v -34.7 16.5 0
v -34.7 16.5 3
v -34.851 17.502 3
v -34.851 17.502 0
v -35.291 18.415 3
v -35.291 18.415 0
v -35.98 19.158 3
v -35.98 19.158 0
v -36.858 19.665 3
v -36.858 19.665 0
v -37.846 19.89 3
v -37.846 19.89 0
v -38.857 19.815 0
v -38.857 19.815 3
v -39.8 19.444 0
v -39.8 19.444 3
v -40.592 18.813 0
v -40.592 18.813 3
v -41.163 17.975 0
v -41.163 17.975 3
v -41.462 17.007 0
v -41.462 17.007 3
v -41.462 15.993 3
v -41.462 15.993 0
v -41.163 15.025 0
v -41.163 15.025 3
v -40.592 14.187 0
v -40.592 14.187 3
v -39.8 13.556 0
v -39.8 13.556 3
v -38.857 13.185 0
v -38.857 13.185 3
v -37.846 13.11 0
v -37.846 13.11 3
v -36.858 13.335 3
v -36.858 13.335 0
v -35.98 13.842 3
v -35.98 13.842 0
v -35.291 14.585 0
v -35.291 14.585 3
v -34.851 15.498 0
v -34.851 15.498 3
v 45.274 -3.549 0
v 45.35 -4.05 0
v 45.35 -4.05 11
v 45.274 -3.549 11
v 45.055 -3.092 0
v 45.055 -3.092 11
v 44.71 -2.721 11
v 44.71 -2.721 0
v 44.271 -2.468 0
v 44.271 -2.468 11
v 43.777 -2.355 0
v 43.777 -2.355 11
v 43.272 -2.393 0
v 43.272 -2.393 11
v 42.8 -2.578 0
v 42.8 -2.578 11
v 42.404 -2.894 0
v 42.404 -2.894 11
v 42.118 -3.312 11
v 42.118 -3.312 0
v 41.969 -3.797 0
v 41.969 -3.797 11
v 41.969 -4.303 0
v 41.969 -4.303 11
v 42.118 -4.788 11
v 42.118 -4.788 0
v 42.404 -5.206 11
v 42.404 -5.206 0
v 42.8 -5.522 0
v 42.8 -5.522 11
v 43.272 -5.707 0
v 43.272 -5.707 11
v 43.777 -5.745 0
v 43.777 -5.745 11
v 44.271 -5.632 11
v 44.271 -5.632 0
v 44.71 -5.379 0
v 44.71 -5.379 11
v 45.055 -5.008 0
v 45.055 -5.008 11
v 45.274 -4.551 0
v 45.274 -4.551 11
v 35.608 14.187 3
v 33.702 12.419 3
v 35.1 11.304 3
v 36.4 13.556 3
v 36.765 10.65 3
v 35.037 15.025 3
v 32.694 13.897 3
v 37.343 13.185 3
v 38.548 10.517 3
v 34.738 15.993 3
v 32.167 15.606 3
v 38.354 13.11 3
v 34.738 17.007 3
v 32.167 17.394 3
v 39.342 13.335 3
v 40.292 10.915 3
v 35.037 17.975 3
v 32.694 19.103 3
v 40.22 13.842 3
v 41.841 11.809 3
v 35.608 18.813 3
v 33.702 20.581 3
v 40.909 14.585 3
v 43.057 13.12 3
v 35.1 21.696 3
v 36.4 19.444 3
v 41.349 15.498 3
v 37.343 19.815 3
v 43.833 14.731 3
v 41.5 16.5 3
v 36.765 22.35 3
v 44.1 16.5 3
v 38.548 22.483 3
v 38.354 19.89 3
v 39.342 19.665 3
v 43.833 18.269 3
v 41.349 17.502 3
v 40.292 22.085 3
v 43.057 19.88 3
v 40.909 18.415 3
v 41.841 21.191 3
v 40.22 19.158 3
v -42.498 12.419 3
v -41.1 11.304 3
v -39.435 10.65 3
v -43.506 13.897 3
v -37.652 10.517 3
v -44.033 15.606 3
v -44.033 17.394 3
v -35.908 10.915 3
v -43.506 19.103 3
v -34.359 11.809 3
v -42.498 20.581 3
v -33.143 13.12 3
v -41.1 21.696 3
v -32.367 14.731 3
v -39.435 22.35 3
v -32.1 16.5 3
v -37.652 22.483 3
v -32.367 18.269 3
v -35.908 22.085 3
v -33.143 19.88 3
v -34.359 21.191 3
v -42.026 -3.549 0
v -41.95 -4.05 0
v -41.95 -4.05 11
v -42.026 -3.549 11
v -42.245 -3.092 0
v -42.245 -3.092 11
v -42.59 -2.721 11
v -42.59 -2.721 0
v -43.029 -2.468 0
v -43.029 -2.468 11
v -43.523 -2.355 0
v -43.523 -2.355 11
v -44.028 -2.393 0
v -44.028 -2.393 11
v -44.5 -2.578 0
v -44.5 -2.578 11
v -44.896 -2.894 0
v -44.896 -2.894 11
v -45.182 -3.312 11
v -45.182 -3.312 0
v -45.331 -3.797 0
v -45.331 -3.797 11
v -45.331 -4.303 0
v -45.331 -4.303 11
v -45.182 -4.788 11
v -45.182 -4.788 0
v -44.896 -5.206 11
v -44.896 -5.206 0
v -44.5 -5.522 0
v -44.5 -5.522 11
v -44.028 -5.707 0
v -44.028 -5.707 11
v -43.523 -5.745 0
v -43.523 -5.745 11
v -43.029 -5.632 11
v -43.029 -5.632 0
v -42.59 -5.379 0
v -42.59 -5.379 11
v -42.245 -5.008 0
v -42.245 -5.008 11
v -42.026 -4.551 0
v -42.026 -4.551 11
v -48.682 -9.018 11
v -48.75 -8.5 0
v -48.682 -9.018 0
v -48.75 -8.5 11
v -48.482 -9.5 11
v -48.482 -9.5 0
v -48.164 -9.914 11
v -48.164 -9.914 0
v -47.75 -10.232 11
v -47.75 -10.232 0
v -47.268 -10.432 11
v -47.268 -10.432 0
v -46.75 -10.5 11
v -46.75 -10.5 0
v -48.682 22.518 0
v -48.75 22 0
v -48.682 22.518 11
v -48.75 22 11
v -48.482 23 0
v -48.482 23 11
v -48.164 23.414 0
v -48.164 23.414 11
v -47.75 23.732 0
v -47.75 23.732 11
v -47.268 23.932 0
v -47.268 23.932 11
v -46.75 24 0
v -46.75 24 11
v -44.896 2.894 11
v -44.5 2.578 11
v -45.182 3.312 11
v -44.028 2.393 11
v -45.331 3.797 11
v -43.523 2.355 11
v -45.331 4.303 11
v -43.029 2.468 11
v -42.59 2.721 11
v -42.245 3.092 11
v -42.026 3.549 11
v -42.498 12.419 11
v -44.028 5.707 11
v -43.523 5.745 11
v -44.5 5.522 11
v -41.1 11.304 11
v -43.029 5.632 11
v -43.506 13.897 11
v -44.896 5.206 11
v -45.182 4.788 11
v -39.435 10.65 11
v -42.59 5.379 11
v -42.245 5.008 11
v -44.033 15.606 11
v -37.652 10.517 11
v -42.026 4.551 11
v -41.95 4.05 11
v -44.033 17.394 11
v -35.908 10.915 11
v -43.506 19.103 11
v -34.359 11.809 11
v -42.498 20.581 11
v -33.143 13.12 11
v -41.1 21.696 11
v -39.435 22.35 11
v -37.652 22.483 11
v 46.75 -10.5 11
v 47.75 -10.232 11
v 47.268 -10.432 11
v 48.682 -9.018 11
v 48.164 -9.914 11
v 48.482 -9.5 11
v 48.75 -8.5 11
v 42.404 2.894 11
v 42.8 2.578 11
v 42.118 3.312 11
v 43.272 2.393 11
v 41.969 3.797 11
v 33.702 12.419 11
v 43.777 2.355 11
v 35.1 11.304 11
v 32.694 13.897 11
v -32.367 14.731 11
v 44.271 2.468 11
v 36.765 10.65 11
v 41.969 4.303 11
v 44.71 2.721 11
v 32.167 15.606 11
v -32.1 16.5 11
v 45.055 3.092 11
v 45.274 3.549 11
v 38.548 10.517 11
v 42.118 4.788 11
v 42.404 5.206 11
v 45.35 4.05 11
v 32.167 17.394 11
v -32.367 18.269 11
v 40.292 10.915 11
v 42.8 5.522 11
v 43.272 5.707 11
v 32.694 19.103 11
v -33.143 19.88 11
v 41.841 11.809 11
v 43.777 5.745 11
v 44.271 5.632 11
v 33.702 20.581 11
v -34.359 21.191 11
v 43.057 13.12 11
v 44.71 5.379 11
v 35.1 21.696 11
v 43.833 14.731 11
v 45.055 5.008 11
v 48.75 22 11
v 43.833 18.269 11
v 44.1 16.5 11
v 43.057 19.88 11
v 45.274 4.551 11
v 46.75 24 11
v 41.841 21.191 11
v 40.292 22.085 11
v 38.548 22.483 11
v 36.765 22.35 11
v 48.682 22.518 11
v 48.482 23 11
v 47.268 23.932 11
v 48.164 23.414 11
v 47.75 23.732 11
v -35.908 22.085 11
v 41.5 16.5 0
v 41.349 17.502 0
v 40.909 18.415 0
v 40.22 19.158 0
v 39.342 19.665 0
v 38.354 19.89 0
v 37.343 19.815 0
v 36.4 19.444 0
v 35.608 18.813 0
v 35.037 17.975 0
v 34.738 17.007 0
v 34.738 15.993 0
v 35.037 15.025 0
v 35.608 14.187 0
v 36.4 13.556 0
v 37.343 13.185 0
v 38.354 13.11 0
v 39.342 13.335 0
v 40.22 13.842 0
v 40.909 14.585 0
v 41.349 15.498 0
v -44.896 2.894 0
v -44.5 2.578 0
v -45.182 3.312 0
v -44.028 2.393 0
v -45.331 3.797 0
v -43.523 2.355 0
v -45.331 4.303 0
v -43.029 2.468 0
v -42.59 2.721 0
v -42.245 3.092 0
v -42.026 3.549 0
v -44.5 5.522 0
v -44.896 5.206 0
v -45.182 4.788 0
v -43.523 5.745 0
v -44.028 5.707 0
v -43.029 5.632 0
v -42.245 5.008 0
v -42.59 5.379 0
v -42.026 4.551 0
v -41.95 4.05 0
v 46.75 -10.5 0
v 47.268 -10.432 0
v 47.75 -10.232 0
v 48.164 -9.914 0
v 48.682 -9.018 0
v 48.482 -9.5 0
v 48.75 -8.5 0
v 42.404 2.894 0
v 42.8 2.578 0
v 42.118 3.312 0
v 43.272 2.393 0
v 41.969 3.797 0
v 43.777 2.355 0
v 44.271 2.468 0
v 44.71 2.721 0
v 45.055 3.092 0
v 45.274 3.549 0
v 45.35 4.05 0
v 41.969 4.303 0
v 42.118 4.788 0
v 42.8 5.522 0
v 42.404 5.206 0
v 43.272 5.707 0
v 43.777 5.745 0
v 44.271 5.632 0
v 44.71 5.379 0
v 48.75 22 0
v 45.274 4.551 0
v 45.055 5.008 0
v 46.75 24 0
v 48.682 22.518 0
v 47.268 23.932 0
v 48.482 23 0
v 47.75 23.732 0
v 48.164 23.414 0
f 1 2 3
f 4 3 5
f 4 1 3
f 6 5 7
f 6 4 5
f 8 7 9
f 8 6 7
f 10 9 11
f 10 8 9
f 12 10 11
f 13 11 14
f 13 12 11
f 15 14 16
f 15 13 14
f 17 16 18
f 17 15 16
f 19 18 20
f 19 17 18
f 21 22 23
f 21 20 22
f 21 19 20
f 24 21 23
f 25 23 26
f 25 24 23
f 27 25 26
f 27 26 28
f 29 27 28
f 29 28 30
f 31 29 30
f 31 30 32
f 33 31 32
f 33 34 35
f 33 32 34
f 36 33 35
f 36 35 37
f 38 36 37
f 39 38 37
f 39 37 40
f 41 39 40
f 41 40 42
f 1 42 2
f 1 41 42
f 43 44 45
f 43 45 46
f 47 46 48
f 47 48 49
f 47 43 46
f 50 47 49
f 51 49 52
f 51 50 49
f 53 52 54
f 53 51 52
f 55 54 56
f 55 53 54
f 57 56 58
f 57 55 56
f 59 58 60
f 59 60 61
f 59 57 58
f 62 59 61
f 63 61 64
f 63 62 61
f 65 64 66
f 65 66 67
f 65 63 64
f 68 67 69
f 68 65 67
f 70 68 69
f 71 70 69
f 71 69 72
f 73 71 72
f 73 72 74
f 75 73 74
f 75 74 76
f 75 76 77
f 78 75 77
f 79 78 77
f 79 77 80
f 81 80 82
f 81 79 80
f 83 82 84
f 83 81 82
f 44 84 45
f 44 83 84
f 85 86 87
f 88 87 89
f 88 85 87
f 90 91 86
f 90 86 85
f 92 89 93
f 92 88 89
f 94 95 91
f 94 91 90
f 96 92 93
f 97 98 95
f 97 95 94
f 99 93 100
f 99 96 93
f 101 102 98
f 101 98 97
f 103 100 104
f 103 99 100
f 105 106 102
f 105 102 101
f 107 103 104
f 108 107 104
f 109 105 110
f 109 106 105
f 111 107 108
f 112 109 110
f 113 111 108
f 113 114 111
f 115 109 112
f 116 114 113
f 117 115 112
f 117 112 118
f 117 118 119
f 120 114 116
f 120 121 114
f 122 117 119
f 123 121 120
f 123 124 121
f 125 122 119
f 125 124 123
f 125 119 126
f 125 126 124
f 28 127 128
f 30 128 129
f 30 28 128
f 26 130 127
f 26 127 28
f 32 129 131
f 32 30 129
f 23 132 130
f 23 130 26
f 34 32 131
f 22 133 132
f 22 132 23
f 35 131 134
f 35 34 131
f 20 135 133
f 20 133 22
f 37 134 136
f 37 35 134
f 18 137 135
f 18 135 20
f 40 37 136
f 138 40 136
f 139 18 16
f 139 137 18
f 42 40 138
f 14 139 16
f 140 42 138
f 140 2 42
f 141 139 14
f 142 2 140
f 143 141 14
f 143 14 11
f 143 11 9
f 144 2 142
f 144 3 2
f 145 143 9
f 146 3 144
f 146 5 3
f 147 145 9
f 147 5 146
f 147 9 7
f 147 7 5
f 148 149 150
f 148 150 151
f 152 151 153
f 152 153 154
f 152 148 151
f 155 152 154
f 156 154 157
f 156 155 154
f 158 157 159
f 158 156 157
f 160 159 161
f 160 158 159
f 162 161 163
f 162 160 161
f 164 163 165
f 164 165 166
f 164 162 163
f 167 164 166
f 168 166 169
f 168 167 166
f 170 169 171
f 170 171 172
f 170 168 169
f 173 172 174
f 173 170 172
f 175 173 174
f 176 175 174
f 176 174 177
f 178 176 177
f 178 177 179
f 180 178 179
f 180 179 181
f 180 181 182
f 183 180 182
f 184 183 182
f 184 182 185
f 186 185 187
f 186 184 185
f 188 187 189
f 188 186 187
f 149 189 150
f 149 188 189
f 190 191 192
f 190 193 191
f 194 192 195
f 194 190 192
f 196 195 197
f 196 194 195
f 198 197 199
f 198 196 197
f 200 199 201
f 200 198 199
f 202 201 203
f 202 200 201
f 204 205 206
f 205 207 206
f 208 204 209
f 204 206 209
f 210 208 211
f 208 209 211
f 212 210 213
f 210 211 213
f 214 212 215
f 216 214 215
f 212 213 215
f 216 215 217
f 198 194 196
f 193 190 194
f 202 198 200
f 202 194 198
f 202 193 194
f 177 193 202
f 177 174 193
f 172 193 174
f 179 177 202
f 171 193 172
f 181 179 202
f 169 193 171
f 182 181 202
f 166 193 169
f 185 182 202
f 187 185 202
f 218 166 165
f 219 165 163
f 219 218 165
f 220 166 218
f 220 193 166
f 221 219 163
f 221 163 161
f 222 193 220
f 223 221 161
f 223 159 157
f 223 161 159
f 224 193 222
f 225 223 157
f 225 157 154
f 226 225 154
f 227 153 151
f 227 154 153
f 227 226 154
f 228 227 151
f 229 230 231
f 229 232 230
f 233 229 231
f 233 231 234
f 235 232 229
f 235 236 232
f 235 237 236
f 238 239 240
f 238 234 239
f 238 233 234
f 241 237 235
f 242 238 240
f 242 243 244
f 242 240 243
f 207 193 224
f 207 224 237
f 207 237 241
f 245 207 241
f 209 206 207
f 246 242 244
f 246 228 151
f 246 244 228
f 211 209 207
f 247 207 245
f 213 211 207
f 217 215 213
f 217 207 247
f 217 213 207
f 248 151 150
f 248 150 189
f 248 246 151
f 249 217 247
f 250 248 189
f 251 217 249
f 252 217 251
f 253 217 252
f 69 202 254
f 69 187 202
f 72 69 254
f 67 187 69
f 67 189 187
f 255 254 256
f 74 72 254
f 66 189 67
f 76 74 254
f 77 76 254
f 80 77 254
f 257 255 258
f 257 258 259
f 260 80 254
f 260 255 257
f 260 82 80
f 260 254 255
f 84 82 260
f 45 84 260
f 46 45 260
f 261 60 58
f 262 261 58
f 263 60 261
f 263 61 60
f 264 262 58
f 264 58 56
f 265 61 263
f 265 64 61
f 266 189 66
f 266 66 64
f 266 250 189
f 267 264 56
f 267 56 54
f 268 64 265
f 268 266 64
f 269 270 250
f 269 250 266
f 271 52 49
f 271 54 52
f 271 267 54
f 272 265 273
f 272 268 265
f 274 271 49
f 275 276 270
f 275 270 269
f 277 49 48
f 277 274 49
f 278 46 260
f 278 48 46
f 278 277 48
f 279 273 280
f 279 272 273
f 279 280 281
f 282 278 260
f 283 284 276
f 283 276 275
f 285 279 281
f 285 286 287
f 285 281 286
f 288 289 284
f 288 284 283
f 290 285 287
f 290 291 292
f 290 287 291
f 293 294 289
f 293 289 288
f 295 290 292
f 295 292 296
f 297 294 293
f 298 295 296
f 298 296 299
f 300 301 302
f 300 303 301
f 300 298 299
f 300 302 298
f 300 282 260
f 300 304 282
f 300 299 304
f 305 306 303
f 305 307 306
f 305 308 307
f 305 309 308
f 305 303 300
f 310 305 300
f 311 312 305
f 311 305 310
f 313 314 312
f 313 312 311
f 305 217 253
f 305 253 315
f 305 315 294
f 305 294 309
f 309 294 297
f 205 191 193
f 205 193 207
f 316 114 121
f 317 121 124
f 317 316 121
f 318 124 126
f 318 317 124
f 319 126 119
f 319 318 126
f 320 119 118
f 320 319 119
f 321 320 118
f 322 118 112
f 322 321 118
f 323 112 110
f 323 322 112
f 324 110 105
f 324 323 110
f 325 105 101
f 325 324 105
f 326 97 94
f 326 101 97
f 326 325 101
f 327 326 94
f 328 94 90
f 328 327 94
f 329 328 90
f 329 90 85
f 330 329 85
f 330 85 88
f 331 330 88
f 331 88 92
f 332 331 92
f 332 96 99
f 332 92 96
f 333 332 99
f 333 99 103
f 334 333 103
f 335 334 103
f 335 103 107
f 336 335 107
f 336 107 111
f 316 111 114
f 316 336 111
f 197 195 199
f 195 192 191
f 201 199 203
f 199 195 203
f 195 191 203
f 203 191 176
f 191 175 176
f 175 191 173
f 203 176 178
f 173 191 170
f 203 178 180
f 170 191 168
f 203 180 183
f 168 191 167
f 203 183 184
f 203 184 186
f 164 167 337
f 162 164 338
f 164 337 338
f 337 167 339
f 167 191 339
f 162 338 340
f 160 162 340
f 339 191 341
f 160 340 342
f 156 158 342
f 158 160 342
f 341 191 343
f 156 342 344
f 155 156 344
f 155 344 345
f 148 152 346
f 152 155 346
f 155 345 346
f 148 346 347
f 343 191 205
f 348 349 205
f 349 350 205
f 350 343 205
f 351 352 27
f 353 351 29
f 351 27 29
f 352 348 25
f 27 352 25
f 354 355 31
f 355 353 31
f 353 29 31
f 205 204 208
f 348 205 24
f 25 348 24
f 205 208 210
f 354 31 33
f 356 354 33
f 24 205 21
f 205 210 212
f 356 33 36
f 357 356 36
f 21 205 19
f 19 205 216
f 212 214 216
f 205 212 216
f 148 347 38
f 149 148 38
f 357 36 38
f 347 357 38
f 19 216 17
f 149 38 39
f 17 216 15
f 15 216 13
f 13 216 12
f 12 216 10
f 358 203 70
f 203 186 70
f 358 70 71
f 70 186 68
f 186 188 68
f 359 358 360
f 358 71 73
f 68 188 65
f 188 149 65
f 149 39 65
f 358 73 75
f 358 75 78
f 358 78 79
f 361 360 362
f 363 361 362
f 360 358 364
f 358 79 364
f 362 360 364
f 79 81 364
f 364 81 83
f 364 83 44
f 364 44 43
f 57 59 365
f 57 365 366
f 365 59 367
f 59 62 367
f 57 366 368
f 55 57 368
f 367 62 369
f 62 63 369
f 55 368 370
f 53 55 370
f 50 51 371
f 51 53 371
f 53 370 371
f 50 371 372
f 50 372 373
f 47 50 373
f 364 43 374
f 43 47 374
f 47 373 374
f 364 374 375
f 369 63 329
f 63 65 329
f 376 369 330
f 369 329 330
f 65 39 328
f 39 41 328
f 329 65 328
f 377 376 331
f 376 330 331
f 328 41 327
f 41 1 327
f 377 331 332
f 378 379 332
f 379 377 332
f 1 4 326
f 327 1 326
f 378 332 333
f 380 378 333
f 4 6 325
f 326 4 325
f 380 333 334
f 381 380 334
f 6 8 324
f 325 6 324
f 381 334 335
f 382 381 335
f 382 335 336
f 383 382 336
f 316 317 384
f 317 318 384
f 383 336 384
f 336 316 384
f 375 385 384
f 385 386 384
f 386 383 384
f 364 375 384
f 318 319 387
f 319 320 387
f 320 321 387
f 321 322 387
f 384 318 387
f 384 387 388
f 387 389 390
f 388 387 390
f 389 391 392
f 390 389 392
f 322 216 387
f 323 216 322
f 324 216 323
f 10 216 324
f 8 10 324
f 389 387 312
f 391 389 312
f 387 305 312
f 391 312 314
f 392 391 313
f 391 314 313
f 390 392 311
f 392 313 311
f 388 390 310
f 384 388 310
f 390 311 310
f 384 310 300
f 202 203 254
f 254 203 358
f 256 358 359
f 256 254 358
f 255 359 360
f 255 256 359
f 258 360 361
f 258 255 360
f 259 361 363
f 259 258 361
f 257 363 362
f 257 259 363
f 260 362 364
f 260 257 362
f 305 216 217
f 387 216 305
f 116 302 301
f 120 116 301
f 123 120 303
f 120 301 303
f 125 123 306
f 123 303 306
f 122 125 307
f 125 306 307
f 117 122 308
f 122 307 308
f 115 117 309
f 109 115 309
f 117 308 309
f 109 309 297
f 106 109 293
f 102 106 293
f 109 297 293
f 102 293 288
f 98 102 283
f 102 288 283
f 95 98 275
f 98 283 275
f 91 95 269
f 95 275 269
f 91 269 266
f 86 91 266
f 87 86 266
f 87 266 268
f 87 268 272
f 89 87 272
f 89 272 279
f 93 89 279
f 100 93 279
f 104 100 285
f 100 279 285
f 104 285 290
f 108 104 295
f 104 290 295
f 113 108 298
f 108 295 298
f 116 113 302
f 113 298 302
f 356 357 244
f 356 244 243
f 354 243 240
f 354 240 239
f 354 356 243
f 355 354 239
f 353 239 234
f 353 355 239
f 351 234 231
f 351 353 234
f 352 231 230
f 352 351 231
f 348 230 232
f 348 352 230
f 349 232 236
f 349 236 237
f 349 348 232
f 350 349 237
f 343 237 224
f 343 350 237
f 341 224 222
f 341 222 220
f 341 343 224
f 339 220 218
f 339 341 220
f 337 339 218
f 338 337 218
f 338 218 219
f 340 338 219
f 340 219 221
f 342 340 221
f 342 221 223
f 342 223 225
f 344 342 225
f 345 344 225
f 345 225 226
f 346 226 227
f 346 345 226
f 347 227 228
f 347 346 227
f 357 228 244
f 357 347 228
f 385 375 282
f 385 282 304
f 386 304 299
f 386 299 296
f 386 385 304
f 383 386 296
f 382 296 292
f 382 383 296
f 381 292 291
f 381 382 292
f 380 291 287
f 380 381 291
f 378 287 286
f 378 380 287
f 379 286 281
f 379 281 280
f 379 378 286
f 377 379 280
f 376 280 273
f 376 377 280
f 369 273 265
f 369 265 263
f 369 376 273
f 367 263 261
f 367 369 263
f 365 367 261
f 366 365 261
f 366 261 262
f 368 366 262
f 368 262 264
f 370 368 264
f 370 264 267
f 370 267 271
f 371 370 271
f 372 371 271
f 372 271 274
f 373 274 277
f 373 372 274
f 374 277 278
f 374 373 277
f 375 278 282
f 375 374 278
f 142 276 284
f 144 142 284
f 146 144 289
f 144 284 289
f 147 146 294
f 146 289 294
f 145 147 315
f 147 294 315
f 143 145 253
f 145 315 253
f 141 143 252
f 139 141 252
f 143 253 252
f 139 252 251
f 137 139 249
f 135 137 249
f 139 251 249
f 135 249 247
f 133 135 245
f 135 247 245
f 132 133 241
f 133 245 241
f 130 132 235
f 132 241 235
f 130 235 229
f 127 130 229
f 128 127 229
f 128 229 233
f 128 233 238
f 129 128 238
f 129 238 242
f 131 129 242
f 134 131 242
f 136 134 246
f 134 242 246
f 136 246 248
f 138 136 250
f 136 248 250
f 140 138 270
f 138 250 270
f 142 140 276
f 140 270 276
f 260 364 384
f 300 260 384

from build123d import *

# Parameters (mm, degrees)
F0_W     = 97.5
F0_H     = 34.5
F0_R     = 1.7
F0_R_2   = 3.4
F1_DEPTH = 11
F2_R     = 6
F3_DEPTH = 8
F4_R     = 2


with BuildPart() as f1:
    # F0 (on Top) → F1 (new body)
    with BuildSketch(Plane.XY):
        with Locations((0, 6.75)):
            Rectangle(F0_W, F0_H)
        with Locations((-43.65, -4.05)):
            Circle(F0_R, mode=Mode.SUBTRACT)
        with Locations((-43.65, 4.05)):
            Circle(F0_R, mode=Mode.SUBTRACT)
        with Locations((43.65, -4.05)):
            Circle(F0_R, mode=Mode.SUBTRACT)
        with Locations((43.65, 4.05)):
            Circle(F0_R, mode=Mode.SUBTRACT)
        with Locations((-38.1, 16.5)):
            Circle(F0_R_2, mode=Mode.SUBTRACT)
        with Locations((38.1, 16.5)):
            Circle(F0_R_2, mode=Mode.SUBTRACT)
    extrude(amount=F1_DEPTH)

    # F2 (on face) → F3 (cut)
    with BuildSketch(Plane.XY.offset(11)):
        with Locations((-38.1, 16.5)):
            Circle(F2_R)
        with Locations((38.1, 16.5)):
            Circle(F2_R)
    extrude(amount=-F3_DEPTH, mode=Mode.SUBTRACT)

    # F4
    f4_edges = [f1.edges().sort_by_distance(p)[0] for p in [
        (-48.75, -10.5, 5.5),
        (-48.75, 24, 5.5),
        (48.75, -10.5, 5.5),
        (48.75, 24, 5.5),
    ]]
    fillet(f4_edges, radius=F4_R)


solid = f1.part
